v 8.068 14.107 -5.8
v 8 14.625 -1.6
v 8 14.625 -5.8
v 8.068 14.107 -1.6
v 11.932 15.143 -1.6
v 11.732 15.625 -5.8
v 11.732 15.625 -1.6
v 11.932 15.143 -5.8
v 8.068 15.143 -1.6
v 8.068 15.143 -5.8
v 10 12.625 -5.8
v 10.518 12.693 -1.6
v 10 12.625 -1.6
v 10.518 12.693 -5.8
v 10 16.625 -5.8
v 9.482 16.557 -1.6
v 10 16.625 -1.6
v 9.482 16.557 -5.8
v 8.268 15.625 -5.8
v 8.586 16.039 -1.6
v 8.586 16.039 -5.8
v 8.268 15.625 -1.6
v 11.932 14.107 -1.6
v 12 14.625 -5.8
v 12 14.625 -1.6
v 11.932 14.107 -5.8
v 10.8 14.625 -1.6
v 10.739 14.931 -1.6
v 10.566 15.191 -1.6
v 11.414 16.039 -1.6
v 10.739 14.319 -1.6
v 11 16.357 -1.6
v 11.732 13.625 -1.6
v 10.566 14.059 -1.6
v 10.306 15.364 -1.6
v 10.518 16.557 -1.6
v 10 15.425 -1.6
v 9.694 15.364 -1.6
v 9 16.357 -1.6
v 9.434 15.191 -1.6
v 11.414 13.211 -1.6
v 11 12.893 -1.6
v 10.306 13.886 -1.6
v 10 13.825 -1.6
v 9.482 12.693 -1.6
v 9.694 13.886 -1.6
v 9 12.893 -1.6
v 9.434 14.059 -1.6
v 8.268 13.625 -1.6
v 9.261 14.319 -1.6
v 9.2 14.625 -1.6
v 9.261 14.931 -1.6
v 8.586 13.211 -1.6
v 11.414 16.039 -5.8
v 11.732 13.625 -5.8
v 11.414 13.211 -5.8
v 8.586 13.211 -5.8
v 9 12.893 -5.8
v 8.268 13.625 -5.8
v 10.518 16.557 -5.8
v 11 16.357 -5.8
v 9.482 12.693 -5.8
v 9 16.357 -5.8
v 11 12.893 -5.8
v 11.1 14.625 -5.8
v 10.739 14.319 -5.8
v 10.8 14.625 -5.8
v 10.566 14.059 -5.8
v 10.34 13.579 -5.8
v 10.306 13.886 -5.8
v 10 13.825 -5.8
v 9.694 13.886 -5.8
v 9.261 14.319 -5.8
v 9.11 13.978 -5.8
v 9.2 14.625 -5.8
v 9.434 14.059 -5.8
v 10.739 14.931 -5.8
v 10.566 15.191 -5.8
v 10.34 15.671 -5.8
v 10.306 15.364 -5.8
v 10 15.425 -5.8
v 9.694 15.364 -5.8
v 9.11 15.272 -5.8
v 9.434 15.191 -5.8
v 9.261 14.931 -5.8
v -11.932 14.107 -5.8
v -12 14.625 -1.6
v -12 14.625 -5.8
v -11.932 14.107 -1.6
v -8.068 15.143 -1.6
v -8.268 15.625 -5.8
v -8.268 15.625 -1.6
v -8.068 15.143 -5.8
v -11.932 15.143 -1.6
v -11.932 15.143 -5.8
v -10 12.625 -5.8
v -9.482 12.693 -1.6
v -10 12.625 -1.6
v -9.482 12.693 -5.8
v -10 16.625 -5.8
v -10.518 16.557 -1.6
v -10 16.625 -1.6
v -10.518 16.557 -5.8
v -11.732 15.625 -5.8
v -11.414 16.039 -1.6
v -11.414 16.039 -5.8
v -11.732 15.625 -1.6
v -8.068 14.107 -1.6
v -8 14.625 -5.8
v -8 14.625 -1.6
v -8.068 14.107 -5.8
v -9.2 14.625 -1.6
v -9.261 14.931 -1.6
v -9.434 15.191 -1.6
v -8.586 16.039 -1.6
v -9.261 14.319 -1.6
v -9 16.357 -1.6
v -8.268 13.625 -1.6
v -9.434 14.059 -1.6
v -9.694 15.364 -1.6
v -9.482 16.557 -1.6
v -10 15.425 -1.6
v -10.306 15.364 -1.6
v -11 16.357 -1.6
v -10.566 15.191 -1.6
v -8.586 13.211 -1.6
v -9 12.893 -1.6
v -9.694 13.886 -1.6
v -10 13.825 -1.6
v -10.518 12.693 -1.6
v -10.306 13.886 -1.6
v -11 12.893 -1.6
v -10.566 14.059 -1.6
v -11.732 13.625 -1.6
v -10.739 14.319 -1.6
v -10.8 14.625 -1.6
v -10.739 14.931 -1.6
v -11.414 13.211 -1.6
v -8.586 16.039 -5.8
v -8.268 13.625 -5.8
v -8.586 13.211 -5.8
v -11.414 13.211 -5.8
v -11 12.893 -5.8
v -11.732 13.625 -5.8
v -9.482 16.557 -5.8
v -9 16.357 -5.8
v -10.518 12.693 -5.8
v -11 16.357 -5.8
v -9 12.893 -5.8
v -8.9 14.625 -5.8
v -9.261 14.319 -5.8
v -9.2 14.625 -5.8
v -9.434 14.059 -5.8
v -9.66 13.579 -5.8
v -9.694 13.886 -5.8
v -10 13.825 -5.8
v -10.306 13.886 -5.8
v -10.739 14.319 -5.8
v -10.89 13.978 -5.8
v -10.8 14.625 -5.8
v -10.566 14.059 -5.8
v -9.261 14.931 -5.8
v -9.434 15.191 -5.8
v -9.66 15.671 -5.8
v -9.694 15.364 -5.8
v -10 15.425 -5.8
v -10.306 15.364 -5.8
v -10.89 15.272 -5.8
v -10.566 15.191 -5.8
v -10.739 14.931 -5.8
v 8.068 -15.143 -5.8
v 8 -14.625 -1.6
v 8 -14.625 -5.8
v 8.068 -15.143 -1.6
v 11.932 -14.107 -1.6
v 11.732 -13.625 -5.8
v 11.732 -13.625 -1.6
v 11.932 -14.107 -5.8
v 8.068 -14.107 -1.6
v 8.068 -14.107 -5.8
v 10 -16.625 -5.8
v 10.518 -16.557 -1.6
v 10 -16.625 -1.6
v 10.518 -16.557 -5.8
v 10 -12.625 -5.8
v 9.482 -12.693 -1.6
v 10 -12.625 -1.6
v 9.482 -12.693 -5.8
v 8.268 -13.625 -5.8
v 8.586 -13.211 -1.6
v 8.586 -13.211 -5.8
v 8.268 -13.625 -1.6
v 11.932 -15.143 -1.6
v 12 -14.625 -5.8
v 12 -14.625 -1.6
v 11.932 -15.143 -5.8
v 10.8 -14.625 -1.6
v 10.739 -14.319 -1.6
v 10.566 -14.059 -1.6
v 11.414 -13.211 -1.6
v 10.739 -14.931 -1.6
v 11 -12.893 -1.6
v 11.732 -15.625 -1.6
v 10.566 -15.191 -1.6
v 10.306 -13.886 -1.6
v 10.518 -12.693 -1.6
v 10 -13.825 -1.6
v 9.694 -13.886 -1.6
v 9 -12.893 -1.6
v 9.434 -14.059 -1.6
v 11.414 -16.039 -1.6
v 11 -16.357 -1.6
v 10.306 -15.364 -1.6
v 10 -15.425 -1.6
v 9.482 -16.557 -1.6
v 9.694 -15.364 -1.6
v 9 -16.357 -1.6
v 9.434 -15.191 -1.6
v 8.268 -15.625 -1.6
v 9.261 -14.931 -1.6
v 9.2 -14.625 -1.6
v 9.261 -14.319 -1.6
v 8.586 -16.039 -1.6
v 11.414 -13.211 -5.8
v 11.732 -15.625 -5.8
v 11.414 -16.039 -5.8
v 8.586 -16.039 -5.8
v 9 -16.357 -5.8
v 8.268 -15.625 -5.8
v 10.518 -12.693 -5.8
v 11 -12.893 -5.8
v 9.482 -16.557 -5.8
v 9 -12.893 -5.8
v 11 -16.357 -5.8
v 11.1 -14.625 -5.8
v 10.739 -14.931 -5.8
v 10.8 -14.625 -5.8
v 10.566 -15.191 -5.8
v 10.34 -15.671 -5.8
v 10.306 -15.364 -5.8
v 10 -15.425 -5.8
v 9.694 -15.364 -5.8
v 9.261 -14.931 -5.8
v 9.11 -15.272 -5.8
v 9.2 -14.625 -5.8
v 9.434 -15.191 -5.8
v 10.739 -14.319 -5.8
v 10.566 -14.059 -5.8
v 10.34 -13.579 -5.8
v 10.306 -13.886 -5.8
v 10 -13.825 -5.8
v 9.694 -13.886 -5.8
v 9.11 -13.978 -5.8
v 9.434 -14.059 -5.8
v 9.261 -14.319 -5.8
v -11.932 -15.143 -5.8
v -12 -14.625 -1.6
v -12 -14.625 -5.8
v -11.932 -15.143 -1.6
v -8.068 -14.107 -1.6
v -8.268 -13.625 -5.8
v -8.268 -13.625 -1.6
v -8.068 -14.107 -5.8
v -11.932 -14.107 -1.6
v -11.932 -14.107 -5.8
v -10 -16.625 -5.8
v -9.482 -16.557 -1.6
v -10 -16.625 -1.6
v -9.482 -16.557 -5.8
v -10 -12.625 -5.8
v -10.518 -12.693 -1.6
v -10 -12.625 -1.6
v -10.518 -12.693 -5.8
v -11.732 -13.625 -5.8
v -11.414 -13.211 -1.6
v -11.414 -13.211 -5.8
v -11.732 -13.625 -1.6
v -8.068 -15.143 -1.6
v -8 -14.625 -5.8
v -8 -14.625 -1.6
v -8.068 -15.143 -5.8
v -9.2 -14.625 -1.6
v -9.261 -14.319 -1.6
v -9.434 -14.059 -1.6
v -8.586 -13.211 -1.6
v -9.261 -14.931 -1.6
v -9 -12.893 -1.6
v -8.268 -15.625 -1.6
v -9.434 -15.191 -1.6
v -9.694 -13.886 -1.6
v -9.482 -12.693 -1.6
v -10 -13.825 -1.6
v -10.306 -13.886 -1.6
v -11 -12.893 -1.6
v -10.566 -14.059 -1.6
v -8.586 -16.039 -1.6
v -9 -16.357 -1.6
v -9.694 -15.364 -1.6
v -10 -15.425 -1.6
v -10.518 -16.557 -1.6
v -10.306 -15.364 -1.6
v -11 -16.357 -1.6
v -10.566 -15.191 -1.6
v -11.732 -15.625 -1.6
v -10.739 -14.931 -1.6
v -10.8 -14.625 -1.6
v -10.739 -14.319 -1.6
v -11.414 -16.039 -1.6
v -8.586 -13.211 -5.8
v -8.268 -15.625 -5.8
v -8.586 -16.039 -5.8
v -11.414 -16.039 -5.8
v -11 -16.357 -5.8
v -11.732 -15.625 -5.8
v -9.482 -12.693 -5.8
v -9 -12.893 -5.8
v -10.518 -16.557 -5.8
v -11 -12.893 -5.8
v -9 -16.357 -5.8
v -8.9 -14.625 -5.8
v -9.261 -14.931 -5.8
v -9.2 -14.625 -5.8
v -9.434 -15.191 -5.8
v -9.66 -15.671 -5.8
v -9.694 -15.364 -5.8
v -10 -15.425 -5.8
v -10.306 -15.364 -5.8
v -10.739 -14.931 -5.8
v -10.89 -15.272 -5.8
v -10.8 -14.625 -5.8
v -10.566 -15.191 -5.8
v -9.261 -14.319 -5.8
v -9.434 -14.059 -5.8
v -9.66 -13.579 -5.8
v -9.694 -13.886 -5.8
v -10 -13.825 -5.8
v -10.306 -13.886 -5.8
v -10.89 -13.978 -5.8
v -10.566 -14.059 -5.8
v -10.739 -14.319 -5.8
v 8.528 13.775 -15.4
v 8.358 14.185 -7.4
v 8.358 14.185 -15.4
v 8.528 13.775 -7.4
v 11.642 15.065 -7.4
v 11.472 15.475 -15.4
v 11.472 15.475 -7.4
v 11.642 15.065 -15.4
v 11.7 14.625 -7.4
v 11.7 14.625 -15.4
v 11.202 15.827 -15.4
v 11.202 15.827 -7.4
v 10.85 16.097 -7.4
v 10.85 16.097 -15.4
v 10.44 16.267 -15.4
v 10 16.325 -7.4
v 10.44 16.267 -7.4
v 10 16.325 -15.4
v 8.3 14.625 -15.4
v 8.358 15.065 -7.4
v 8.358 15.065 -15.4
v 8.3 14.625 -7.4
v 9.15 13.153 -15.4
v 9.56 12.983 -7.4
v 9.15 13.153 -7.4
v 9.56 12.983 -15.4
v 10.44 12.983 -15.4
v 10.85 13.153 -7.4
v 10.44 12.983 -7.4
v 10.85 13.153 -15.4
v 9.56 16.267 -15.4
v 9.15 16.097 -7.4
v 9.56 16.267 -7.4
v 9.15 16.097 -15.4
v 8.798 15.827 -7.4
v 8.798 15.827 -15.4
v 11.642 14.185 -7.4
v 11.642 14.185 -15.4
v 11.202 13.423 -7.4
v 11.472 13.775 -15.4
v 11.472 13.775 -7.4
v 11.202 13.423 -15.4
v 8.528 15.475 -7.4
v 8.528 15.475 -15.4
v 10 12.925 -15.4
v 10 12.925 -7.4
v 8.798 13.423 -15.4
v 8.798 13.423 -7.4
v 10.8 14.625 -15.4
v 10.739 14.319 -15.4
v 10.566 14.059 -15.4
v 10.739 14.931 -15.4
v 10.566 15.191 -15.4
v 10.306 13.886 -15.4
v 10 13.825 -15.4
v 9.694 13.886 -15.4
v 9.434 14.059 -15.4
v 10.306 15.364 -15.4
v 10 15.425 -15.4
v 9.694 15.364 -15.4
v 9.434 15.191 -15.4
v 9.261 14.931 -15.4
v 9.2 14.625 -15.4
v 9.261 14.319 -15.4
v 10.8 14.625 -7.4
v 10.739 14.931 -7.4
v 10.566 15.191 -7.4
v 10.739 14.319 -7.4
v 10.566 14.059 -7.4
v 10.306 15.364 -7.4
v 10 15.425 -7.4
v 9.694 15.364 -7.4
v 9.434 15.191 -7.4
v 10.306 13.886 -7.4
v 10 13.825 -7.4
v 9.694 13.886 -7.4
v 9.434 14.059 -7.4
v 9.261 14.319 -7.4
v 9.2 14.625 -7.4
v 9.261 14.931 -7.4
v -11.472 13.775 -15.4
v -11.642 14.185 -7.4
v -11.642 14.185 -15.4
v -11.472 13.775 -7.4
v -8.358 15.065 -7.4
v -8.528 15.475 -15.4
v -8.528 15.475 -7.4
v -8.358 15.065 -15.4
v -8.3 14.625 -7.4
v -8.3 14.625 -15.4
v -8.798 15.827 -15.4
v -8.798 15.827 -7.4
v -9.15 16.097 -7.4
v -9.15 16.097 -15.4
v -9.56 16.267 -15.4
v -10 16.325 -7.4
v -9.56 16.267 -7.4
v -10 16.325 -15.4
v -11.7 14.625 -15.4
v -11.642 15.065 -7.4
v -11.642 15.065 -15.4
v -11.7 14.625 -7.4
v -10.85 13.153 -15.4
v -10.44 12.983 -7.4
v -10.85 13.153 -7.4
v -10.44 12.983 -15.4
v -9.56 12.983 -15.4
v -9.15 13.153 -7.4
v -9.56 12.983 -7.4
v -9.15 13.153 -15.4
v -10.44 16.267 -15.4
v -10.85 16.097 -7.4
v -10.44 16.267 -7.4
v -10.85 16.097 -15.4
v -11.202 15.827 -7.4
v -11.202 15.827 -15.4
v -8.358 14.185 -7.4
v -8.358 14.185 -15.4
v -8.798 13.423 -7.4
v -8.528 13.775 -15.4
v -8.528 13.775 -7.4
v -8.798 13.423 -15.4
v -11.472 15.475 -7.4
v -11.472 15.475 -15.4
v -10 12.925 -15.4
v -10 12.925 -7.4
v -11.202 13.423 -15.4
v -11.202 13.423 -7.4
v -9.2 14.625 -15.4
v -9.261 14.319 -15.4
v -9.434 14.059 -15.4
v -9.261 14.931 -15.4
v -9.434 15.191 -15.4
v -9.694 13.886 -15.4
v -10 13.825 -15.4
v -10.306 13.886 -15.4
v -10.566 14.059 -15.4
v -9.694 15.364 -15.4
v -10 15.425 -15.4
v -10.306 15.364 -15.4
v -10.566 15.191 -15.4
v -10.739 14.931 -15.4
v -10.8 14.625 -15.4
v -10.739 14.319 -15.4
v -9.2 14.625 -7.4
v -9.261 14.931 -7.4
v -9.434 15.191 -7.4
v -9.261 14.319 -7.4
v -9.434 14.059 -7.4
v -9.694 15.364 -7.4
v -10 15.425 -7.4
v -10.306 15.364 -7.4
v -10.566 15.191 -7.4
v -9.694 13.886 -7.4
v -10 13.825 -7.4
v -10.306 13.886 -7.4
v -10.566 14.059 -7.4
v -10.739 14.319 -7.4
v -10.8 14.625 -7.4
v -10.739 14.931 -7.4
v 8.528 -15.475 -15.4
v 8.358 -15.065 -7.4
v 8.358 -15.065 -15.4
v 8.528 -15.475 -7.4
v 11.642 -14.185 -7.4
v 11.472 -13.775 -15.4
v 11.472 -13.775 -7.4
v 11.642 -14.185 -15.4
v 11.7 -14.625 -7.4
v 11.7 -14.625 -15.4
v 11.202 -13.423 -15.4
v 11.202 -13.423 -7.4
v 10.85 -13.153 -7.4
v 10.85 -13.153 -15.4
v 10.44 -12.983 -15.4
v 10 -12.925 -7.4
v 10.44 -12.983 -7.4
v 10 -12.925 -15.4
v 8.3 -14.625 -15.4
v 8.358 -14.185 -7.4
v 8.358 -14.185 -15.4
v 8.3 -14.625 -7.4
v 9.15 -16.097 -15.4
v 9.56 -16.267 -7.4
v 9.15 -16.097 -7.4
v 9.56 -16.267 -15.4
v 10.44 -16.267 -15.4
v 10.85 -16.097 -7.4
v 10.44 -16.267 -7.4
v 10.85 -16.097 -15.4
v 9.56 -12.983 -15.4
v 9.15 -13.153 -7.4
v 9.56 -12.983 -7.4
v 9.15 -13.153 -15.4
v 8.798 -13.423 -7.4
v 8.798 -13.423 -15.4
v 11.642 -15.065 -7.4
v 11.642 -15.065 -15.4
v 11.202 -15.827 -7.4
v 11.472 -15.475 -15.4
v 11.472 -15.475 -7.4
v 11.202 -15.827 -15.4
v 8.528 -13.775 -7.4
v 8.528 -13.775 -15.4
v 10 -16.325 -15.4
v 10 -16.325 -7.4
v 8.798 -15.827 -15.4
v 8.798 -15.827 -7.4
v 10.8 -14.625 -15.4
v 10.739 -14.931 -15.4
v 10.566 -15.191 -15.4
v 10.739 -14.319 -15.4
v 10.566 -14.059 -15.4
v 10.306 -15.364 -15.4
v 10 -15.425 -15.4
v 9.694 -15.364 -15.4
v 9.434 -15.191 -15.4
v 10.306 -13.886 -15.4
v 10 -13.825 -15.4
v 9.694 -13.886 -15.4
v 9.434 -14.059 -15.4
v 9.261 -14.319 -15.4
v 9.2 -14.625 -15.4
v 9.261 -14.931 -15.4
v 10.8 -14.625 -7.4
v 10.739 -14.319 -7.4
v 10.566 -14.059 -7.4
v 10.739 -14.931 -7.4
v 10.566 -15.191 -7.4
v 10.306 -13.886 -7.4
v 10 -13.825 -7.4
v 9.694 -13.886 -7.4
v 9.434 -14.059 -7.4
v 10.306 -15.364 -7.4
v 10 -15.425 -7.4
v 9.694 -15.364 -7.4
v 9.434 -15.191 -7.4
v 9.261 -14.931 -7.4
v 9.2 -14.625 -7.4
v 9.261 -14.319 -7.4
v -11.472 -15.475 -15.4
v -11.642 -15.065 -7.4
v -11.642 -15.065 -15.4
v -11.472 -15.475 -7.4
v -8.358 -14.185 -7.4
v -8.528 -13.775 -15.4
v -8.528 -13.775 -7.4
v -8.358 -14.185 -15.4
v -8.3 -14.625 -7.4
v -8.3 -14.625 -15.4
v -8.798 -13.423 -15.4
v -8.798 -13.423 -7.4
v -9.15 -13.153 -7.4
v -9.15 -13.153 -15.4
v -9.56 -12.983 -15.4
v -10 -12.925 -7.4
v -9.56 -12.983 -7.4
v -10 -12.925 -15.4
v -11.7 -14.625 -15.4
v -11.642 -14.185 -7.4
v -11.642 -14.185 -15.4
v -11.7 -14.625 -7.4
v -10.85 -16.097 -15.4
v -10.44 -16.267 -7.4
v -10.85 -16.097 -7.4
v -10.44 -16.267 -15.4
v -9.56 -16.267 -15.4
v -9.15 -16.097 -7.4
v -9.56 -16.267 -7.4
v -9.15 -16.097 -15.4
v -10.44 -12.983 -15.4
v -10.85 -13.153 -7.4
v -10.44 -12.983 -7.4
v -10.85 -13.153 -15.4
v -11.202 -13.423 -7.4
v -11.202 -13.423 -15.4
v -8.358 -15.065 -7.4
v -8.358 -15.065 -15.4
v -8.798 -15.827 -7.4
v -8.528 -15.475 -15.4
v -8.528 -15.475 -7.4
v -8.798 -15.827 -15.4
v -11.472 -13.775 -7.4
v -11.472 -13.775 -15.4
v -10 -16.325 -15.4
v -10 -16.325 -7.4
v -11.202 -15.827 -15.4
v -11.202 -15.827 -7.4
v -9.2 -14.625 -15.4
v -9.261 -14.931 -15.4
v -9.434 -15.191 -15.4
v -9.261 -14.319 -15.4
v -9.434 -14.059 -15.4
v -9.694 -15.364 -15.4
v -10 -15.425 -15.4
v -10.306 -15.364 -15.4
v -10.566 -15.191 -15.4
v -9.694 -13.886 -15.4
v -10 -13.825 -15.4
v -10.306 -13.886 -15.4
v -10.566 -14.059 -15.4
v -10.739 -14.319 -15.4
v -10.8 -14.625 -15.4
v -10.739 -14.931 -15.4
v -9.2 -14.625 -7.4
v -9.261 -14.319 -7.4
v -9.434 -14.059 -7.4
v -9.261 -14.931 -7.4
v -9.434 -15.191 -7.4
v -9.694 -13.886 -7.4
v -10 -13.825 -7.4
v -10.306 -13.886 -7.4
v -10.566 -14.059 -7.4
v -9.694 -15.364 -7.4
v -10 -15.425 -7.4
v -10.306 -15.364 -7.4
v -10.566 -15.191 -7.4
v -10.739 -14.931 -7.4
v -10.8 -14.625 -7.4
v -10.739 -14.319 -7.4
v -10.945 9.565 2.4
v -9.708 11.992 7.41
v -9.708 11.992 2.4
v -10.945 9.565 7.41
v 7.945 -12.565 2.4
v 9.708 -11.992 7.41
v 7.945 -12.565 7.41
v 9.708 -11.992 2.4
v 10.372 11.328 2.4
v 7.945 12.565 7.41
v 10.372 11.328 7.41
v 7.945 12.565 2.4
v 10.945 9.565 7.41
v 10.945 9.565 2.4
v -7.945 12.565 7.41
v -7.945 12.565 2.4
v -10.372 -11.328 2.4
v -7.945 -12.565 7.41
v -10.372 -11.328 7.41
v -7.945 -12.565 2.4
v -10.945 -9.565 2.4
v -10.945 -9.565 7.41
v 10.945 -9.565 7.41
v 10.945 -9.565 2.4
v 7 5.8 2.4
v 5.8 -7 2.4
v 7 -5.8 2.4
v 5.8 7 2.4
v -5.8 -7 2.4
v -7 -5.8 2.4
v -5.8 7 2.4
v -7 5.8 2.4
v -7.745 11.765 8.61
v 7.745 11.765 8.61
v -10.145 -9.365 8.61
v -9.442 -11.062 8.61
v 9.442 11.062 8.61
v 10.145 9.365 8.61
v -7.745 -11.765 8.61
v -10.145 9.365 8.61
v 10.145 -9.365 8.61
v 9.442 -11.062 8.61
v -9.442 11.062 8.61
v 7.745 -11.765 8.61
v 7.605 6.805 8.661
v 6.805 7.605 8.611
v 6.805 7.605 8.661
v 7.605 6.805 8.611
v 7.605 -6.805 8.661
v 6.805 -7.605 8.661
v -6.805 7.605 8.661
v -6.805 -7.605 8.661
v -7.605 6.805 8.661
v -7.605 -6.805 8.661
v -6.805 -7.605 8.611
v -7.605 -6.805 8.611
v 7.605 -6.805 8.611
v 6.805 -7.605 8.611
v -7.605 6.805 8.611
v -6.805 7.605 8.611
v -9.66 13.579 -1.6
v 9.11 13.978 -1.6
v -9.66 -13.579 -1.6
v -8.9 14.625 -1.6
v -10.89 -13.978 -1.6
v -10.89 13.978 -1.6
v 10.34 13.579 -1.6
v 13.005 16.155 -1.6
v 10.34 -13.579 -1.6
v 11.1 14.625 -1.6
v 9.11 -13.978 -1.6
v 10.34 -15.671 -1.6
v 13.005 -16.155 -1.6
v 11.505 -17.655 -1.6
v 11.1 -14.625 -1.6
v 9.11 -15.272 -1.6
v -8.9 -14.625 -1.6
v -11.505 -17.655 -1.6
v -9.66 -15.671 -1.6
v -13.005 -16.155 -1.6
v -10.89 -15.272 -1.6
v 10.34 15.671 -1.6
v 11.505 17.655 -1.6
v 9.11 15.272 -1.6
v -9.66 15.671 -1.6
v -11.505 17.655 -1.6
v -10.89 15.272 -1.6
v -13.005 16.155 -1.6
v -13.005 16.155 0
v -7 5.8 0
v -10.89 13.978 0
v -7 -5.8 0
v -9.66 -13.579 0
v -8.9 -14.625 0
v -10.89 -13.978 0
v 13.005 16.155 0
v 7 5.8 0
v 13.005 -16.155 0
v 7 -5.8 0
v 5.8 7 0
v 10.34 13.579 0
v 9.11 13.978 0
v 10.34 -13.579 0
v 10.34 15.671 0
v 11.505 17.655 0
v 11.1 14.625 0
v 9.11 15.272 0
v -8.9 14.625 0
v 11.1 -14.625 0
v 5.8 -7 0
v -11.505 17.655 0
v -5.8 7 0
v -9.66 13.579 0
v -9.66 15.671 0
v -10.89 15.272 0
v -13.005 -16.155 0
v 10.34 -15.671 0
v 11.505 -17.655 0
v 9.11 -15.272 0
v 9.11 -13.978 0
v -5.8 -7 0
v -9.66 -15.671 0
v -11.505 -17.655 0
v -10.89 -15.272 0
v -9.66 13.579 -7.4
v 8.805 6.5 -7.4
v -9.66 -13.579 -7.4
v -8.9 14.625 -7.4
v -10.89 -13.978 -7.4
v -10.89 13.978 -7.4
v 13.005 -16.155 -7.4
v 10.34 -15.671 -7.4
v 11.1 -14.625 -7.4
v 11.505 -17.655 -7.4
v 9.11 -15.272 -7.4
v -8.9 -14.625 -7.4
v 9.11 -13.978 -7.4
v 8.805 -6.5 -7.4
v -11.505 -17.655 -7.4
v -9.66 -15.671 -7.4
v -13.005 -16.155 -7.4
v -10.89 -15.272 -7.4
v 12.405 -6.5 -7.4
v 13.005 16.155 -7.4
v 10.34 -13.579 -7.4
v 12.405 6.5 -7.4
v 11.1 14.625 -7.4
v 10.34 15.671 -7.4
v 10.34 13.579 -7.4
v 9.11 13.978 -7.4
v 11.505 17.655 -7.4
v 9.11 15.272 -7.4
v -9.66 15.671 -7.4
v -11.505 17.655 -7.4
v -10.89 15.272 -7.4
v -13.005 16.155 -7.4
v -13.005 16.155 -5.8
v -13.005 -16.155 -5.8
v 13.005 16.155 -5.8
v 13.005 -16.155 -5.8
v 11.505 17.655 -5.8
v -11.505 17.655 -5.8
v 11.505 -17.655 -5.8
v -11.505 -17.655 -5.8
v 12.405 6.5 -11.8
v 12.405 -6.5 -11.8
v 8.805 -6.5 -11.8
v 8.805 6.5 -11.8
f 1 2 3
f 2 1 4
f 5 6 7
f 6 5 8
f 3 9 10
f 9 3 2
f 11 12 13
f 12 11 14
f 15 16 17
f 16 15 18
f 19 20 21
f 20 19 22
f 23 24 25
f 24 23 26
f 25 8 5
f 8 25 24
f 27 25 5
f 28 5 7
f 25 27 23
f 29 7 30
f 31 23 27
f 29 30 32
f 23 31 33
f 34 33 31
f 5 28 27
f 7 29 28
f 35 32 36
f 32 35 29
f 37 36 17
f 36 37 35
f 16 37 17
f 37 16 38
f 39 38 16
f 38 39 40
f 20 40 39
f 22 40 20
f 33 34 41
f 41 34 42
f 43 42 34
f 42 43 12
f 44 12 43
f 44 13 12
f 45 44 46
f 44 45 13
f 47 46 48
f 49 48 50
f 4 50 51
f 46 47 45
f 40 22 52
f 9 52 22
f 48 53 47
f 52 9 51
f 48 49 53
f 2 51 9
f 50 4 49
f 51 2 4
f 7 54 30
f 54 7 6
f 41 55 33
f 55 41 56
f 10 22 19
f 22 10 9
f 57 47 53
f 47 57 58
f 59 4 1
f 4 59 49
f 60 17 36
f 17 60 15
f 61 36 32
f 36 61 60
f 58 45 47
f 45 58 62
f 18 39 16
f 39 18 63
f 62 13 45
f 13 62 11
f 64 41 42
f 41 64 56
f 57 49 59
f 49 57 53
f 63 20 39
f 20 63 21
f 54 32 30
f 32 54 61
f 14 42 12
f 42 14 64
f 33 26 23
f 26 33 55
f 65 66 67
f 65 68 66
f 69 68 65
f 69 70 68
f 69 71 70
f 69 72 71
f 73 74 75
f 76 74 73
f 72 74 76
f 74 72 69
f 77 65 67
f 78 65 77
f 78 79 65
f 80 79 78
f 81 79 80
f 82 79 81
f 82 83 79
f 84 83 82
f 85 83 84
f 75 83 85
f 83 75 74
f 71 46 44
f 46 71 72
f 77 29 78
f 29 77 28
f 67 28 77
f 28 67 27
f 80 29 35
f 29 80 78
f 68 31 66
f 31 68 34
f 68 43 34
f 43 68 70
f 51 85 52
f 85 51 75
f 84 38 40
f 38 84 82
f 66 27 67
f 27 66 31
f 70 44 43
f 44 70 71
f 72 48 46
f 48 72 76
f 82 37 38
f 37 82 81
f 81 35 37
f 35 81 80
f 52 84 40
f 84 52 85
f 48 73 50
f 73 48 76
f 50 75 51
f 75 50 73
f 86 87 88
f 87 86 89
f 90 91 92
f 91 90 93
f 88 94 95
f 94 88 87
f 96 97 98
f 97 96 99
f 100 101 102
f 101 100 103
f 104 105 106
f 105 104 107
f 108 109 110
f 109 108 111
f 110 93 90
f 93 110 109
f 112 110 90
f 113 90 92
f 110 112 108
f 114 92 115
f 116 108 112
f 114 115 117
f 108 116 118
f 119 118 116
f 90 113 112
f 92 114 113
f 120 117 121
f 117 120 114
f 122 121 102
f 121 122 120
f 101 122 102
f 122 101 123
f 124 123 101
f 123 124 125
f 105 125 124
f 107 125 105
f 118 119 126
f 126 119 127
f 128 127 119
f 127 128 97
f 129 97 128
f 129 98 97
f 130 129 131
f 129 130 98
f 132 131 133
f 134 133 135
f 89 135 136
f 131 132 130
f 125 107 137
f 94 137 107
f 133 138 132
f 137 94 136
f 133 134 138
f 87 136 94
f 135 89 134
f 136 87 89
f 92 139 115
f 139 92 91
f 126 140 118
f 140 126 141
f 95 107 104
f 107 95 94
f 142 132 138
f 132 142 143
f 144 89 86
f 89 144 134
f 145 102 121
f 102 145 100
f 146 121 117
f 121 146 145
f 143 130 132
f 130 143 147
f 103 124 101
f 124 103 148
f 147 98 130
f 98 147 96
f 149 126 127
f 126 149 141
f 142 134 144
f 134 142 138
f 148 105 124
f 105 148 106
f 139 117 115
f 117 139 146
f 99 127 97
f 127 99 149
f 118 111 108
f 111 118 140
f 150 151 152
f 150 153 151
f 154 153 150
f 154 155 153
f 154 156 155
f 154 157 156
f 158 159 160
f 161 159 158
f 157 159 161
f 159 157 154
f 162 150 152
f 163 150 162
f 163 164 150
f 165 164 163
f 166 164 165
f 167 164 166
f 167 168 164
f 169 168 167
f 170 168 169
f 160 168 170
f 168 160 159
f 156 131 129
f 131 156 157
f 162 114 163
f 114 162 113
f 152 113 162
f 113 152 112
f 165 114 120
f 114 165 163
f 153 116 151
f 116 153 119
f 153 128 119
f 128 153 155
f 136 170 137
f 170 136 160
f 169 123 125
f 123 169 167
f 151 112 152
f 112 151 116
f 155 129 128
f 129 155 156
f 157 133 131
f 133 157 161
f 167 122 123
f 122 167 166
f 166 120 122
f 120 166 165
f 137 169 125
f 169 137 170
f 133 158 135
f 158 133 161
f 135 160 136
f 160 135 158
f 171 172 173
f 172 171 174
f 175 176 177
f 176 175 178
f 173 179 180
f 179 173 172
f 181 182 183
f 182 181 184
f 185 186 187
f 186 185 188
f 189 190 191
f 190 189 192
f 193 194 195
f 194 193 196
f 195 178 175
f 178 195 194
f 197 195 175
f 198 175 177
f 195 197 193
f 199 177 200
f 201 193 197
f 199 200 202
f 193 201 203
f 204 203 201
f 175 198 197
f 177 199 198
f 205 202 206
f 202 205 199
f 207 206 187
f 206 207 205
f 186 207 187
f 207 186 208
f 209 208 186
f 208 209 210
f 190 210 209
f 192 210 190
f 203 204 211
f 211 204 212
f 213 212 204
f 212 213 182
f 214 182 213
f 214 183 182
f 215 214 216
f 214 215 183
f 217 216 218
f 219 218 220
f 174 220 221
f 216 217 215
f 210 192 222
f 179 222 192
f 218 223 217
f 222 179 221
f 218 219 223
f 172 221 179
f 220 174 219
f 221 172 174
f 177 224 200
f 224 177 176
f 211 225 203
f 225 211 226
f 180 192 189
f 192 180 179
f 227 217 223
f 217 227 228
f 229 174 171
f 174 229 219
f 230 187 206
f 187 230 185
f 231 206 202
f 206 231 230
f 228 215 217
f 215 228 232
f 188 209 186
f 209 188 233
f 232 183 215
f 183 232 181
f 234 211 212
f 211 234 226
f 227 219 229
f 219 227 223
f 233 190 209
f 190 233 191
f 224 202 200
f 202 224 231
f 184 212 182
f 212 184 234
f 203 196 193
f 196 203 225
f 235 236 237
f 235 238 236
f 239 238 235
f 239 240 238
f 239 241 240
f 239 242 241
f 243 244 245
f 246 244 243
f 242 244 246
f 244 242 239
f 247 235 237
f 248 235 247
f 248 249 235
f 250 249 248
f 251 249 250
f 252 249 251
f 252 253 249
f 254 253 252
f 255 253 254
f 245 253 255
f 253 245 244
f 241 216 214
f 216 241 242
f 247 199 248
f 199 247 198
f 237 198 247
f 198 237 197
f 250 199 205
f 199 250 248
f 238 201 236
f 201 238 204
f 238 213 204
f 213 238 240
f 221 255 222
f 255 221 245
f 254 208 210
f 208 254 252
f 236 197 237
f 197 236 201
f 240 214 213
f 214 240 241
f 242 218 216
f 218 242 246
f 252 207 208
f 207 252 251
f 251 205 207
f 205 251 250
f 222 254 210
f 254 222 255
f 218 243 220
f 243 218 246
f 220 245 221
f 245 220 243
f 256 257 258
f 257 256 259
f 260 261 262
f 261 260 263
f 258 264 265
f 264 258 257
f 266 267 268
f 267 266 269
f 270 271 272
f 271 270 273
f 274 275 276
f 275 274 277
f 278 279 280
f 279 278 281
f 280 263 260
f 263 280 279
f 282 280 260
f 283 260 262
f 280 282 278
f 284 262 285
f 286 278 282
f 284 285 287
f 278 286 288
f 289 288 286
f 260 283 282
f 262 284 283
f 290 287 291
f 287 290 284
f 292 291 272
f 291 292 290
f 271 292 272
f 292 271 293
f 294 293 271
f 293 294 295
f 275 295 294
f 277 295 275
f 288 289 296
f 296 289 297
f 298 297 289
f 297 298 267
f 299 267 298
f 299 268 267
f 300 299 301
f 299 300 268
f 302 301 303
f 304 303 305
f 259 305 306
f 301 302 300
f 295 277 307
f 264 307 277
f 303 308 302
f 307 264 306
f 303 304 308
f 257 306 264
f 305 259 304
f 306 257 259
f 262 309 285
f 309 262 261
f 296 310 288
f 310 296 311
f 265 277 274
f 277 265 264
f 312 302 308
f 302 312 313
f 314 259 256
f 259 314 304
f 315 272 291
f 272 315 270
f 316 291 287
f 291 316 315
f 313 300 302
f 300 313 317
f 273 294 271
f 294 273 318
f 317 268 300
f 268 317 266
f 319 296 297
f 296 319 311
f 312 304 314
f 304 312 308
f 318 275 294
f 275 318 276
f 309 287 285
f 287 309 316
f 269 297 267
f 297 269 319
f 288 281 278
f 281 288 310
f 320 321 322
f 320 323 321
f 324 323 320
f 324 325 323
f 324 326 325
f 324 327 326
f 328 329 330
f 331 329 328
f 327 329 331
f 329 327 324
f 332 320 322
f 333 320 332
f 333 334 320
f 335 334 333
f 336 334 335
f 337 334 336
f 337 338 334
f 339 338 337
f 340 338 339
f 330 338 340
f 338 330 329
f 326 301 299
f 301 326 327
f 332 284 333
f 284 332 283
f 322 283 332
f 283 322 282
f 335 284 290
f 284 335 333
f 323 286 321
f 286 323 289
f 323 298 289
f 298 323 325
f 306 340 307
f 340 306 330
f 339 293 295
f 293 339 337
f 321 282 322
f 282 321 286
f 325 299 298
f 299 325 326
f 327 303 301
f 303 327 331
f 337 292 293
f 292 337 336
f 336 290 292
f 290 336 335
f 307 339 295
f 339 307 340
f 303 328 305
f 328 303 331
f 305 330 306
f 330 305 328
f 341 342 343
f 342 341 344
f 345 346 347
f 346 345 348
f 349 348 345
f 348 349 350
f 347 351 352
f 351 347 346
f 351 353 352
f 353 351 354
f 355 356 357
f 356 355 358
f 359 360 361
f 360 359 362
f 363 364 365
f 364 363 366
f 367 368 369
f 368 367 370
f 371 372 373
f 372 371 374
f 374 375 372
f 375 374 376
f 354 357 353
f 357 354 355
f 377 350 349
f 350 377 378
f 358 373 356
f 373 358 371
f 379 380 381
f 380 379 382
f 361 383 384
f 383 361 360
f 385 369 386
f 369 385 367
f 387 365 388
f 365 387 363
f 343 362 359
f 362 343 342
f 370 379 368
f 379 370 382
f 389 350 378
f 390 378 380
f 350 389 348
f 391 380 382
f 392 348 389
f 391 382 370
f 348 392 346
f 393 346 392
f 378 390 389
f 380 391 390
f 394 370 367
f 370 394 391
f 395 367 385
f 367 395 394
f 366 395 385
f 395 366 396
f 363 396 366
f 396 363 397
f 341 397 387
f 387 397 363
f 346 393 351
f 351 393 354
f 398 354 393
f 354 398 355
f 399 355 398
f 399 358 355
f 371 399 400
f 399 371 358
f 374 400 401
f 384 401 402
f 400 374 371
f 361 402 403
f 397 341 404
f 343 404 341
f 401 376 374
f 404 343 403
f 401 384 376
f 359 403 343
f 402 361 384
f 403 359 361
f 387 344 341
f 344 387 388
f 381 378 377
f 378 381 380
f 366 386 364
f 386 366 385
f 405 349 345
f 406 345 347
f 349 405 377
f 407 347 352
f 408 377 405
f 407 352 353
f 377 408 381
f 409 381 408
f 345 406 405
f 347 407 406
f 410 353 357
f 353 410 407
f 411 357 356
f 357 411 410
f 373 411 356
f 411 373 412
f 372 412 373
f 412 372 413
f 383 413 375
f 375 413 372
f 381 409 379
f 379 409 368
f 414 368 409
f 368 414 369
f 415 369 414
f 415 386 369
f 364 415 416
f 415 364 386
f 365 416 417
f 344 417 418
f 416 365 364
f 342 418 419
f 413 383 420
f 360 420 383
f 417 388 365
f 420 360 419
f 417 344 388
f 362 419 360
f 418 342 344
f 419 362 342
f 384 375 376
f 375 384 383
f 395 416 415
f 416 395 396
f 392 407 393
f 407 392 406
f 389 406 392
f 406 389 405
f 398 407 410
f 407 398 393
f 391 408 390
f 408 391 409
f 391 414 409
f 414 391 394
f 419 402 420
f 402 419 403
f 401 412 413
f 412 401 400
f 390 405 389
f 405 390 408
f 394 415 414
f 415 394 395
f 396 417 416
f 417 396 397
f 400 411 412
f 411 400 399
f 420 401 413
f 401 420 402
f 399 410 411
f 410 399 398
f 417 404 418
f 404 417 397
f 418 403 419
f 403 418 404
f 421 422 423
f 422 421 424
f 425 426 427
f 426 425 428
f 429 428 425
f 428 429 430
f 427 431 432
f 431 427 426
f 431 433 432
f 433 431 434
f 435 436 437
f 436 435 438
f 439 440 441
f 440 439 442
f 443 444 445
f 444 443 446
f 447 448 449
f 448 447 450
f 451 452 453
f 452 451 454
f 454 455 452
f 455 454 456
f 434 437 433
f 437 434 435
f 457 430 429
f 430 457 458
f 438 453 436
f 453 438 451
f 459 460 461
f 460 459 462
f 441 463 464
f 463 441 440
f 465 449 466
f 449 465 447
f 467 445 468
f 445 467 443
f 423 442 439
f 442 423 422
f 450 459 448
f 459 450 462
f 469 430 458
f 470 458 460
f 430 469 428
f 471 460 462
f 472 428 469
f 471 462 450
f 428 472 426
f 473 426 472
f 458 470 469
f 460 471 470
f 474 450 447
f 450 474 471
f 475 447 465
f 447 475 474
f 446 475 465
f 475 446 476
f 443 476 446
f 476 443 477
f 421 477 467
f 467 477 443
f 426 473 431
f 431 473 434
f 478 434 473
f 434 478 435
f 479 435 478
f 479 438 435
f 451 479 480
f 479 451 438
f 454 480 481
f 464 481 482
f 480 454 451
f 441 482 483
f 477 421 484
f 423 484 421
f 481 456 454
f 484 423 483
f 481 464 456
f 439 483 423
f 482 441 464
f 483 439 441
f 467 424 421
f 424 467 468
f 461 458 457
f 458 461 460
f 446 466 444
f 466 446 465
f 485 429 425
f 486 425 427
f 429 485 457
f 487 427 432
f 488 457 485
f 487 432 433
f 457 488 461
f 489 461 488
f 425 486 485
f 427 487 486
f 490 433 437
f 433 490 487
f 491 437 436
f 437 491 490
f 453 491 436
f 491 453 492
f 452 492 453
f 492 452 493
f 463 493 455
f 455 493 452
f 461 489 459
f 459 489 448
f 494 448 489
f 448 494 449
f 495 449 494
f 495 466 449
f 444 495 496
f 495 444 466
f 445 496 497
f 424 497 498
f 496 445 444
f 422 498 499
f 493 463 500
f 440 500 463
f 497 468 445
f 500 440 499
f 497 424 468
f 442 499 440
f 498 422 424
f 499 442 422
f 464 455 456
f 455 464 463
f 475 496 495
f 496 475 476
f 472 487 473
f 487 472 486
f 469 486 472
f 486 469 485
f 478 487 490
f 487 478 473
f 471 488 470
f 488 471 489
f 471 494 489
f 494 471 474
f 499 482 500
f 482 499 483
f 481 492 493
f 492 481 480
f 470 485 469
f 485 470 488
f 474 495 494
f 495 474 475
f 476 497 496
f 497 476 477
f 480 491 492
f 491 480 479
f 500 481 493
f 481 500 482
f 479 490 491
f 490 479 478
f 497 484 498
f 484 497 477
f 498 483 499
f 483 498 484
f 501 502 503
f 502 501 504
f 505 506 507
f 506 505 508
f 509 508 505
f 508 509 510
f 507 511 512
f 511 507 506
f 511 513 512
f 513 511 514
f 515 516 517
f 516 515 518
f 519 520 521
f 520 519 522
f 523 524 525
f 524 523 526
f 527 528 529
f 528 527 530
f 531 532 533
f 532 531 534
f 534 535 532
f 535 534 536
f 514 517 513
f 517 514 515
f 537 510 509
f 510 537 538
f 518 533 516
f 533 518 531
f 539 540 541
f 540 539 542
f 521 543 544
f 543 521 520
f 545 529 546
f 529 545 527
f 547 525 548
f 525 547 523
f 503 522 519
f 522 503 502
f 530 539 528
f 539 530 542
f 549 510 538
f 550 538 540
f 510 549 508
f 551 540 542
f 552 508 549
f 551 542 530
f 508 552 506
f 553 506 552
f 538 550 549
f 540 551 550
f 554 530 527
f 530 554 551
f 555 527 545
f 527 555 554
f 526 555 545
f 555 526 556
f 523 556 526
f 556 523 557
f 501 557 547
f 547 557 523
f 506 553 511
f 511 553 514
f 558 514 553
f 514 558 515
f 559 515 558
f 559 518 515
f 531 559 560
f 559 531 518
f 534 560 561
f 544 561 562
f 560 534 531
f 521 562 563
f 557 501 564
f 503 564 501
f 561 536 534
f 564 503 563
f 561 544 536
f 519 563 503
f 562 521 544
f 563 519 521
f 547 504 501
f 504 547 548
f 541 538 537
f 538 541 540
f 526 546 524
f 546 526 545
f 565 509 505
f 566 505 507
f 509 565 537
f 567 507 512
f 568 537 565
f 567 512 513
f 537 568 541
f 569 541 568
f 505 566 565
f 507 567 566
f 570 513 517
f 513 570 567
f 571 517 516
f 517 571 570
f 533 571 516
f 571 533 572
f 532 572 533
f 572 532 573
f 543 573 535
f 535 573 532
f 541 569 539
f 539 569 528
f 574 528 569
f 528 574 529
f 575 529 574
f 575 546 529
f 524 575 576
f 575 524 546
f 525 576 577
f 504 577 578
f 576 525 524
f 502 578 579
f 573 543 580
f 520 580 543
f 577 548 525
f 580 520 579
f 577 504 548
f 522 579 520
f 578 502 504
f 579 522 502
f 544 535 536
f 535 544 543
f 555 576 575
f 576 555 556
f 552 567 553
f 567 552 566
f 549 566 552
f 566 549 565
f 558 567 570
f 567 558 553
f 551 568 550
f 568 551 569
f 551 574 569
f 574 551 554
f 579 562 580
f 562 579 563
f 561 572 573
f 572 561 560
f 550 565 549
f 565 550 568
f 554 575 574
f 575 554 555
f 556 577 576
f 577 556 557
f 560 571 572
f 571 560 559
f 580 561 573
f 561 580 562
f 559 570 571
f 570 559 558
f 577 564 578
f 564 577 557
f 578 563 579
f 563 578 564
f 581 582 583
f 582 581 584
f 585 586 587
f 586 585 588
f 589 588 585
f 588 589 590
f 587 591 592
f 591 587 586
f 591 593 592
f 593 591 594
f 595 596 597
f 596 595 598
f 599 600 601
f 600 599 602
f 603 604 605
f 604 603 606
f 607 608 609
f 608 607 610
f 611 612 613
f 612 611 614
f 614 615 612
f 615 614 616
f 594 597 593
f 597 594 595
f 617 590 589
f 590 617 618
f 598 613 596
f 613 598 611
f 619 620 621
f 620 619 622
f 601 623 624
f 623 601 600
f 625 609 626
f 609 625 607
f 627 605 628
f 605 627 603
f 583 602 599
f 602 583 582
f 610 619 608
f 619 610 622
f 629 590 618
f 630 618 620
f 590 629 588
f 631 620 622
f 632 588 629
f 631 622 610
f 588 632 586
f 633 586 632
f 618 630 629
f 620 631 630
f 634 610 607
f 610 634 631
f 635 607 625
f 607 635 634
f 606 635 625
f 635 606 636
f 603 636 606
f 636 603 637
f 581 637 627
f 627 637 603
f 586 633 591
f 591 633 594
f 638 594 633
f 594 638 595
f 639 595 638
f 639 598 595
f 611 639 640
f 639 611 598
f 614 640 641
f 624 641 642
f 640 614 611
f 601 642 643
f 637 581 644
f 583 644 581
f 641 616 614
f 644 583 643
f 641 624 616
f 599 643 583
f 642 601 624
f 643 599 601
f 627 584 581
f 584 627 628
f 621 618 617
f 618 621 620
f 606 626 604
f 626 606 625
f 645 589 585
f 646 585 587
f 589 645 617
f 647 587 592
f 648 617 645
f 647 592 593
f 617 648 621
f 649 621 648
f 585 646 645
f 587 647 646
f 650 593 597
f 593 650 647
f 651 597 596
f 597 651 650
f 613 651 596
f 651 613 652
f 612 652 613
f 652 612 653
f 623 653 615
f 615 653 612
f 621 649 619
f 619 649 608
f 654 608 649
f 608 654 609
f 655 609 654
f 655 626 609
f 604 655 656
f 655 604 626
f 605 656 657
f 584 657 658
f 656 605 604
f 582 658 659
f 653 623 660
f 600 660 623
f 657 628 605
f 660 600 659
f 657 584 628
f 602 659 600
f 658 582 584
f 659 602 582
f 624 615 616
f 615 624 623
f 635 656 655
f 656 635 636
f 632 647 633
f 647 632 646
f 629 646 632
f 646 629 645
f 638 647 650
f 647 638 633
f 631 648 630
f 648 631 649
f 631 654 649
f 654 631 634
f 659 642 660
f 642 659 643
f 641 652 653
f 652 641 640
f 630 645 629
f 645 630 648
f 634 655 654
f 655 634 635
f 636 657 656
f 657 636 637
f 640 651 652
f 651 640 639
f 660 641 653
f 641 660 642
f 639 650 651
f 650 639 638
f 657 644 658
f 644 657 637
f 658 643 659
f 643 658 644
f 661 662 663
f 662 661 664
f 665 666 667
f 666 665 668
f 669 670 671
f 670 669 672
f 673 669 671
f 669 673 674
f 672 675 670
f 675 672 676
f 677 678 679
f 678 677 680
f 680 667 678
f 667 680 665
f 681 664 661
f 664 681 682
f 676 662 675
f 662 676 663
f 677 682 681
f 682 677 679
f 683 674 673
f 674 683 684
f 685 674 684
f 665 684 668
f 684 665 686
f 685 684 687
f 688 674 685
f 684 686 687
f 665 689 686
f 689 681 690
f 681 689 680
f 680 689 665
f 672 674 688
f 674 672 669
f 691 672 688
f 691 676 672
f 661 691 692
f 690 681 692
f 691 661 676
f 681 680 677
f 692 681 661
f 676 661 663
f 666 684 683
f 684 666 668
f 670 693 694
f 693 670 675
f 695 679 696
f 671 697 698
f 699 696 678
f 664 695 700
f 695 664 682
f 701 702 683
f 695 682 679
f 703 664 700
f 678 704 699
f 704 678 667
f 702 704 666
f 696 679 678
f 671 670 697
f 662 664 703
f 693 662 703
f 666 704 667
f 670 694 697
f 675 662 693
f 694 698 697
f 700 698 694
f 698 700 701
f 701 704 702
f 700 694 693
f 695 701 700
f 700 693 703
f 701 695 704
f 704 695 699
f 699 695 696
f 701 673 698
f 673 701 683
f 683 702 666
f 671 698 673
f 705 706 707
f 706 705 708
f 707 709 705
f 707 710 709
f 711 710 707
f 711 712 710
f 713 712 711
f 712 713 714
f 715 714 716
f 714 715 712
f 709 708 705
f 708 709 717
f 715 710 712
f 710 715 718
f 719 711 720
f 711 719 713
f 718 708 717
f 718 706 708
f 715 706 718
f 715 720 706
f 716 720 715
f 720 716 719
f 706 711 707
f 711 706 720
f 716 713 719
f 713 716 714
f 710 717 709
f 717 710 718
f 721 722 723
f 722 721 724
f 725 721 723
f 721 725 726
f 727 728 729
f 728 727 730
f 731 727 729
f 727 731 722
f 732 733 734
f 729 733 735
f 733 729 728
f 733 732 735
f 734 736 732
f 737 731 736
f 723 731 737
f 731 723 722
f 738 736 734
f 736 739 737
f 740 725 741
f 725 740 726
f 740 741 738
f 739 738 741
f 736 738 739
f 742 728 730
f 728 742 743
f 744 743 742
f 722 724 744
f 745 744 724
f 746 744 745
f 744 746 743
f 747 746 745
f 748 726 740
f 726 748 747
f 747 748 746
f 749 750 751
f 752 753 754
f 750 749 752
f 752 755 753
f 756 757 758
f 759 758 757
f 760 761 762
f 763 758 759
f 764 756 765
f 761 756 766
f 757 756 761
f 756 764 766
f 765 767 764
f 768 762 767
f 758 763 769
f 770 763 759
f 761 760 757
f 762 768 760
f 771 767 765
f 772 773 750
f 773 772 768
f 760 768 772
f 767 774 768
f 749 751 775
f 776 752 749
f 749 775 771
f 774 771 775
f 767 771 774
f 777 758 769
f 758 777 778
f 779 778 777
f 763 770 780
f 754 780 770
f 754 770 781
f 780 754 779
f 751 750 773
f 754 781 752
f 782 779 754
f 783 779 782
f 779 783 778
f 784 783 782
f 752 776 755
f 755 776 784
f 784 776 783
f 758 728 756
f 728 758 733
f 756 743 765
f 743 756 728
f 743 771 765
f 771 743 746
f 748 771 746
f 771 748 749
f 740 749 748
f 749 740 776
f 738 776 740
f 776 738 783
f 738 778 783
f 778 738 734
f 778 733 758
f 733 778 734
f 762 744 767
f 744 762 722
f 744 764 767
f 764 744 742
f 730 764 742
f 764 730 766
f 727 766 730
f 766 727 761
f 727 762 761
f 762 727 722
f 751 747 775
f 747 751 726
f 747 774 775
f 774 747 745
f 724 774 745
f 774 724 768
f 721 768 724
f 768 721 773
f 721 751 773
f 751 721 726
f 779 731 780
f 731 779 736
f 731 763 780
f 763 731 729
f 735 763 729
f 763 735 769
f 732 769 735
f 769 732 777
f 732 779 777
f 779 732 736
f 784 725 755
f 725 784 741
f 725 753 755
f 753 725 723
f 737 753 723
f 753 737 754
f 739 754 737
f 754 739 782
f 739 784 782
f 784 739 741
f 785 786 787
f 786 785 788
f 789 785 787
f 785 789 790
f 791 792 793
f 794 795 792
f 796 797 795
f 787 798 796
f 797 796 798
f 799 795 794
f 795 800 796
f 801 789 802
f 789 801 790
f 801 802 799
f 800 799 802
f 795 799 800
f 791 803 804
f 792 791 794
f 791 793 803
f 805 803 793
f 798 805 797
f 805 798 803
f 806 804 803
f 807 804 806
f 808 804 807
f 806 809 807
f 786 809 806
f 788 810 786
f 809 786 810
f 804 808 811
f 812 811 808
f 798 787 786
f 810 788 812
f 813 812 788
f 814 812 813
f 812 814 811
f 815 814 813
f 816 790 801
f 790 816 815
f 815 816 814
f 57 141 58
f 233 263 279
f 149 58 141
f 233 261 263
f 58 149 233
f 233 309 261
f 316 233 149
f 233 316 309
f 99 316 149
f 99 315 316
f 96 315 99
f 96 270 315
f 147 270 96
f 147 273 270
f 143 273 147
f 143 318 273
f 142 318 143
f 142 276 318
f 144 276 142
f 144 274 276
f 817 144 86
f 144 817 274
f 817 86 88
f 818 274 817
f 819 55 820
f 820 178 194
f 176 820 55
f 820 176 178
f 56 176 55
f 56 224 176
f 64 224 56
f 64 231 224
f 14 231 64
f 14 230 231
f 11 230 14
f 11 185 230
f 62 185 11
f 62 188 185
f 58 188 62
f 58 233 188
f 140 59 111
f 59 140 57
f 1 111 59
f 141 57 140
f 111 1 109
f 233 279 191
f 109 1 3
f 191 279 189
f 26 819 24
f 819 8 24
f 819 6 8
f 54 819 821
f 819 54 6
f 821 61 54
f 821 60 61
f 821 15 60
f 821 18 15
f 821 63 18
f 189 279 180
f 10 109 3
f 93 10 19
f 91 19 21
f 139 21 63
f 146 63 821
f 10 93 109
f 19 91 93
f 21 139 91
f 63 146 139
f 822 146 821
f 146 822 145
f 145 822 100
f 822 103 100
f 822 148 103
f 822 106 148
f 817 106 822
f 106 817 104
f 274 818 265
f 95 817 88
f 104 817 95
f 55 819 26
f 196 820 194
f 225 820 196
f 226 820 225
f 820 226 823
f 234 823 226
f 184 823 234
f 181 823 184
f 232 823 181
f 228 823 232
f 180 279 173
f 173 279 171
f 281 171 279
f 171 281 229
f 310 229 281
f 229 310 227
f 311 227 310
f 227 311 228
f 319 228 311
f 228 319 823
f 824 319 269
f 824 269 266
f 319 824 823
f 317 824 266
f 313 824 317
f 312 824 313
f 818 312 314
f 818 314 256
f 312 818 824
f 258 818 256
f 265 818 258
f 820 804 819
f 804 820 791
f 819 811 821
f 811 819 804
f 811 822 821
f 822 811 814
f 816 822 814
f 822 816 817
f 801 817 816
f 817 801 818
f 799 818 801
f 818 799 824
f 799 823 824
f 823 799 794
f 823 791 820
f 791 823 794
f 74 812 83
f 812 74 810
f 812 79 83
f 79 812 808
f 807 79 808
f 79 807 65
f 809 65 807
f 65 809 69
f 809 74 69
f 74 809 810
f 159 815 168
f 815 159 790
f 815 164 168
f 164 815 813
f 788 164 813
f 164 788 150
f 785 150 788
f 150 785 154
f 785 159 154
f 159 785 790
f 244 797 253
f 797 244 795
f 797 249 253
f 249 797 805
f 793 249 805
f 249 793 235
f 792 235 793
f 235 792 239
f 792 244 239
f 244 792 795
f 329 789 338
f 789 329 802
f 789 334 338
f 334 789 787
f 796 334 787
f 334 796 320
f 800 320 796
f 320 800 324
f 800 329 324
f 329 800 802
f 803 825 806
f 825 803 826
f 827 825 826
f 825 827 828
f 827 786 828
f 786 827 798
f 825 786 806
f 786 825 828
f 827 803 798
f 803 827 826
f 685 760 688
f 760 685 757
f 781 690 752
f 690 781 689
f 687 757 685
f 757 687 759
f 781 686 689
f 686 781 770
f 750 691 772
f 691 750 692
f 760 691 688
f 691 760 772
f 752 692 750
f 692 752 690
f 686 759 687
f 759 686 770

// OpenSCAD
// ============================================================
//  Waveshare 0.85" ScreenKey Module B (SKU 34168) — replica v3
//
//  Construction per the OFFICIAL vendor drawing (2026-07-10,
//  docs/reference/screenkey-module/vendor-dimensions.pdf):
//    keycap 21.89 × 25.13, 8.60 proud
//    FRONT PCB 26.01 × 35.31 × 1.6  (switch + LCD FPC side)
//    4× SOLDERED THREADED NUTS (M2) between the boards @ 20.0 × 29.25
//    REAR PCB 26.01 × 35.31 × 1.6   (9P connector underneath)
//    4× removable 8 mm brass standoffs threaded into the nuts
//    cap front → rear PCB back: 16.0; with standoffs: 24.0
//
//  Mounting WITHOUT standoffs: M2 screws from behind, through the
//  rear-PCB corner holes, into the internal soldered nuts.
//
//  Origin: centre of FRONT PCB front face. Cap +Z, boards −Z.
// ============================================================

MOD_W       = 26.01;
MOD_H       = 35.31;
PCB_T       = 1.60;
NUT_GAP     = 4.20;    // soldered nut spacer between the two boards (16 − 8.6 − 2×1.6)
CAP_PROUD   = 8.60;    // cap top above front PCB front face
MOD_TOTAL   = 24.00;   // with factory standoffs installed
// depth behind front face without standoffs:
BODY_DEPTH  = PCB_T + NUT_GAP + PCB_T;              // 5.7
STANDOFF_L  = MOD_TOTAL - CAP_PROUD - BODY_DEPTH;   // 9.7 (removable)
STANDOFF_D  = 3.4;
NUT_OD      = 4.0;     // soldered M2 nut/spacer
NUT_ID      = 1.6;     // M2 thread
MOUNT_DX    = 20.00;
MOUNT_DY    = 29.25;

CAP_WX      = 21.89;
CAP_WY      = 25.13;
CAP_R       = 3.0;
CAP_H       = 6.2;
GLASS_W     = 15.21;

SW_BODY_W   = 14.0;
SW_BODY_H   = 2.4;

CONN_W      = 3.6;     // 9P PicoBlade receptacle on rear PCB underside
CONN_L      = 13.0;
CONN_H      = 4.4;

function screenkey_mounts() = [
    [ MOUNT_DX/2,  MOUNT_DY/2],
    [-MOUNT_DX/2,  MOUNT_DY/2],
    [ MOUNT_DX/2, -MOUNT_DY/2],
    [-MOUNT_DX/2, -MOUNT_DY/2]
];

// z of the rear PCB back face relative to origin (mounting datum)
function screenkey_rear_z() = -BODY_DEPTH;

module _rsq(w, h, r) {
    offset(r = r) square([w - 2*r, h - 2*r], center = true);
}

module _pcb(z_top) {
    color("#161618")
        translate([0, 0, z_top - PCB_T])
            linear_extrude(PCB_T)
                difference() {
                    _rsq(MOD_W, MOD_H, 1.5);
                    for (p = screenkey_mounts())
                        translate(p) circle(d = 2.2);
                }
}

module screenkey_cap() {
    color("#141416")
        translate([0, 0, SW_BODY_H])
            linear_extrude(CAP_H - 1.2)
                _rsq(CAP_WX, CAP_WY, CAP_R);
    color("#0d0d10")
        translate([0, 0, SW_BODY_H + CAP_H - 1.2])
            hull() {
                linear_extrude(0.01) _rsq(CAP_WX, CAP_WY, CAP_R);
                translate([0, 0, 1.2])
                    linear_extrude(0.01) _rsq(CAP_WX - 1.6, CAP_WY - 1.6, CAP_R - 0.6);
            }
    color("#1a2b3c")
        translate([0, 0, SW_BODY_H + CAP_H + 0.011])
            linear_extrude(0.05)
                _rsq(GLASS_W, GLASS_W, 0.8);
}

module screenkey_module(with_cap = true, with_standoffs = false) {
    // FRONT PCB (switch carrier)
    _pcb(0);

    // soldered threaded nut spacers between the boards
    for (p = screenkey_mounts())
        color("#c9a24b")
            translate([p[0], p[1], -PCB_T - NUT_GAP])
                difference() {
                    cylinder(d = NUT_OD, h = NUT_GAP, $fn = 24);
                    translate([0, 0, -0.1]) cylinder(d = NUT_ID, h = NUT_GAP + 0.2, $fn = 16);
                }

    // REAR PCB (connector board)
    _pcb(-PCB_T - NUT_GAP);

    // 9P receptacle on rear PCB underside
    color("#e8e4da")
        translate([MOD_W/2 - CONN_W - 0.6, -CONN_L/2, -BODY_DEPTH - CONN_H])
            cube([CONN_W, CONN_L, CONN_H]);

    // switch body on front
    color("#3a3a3e")
        linear_extrude(SW_BODY_H)
            _rsq(SW_BODY_W, SW_BODY_W, 1.2);

    // factory standoffs (removable — unscrew from the nuts)
    if (with_standoffs)
        for (p = screenkey_mounts())
            color("#b28a3e")
                translate([p[0], p[1], -BODY_DEPTH - STANDOFF_L])
                    difference() {
                        cylinder(d = STANDOFF_D, h = STANDOFF_L, $fn = 24);
                        translate([0, 0, -0.1]) cylinder(d = NUT_ID, h = STANDOFF_L + 0.2, $fn = 16);
                    }

    if (with_cap) screenkey_cap();
}

if (is_undef(NO_STANDALONE)) screenkey_module(with_standoffs = true);
